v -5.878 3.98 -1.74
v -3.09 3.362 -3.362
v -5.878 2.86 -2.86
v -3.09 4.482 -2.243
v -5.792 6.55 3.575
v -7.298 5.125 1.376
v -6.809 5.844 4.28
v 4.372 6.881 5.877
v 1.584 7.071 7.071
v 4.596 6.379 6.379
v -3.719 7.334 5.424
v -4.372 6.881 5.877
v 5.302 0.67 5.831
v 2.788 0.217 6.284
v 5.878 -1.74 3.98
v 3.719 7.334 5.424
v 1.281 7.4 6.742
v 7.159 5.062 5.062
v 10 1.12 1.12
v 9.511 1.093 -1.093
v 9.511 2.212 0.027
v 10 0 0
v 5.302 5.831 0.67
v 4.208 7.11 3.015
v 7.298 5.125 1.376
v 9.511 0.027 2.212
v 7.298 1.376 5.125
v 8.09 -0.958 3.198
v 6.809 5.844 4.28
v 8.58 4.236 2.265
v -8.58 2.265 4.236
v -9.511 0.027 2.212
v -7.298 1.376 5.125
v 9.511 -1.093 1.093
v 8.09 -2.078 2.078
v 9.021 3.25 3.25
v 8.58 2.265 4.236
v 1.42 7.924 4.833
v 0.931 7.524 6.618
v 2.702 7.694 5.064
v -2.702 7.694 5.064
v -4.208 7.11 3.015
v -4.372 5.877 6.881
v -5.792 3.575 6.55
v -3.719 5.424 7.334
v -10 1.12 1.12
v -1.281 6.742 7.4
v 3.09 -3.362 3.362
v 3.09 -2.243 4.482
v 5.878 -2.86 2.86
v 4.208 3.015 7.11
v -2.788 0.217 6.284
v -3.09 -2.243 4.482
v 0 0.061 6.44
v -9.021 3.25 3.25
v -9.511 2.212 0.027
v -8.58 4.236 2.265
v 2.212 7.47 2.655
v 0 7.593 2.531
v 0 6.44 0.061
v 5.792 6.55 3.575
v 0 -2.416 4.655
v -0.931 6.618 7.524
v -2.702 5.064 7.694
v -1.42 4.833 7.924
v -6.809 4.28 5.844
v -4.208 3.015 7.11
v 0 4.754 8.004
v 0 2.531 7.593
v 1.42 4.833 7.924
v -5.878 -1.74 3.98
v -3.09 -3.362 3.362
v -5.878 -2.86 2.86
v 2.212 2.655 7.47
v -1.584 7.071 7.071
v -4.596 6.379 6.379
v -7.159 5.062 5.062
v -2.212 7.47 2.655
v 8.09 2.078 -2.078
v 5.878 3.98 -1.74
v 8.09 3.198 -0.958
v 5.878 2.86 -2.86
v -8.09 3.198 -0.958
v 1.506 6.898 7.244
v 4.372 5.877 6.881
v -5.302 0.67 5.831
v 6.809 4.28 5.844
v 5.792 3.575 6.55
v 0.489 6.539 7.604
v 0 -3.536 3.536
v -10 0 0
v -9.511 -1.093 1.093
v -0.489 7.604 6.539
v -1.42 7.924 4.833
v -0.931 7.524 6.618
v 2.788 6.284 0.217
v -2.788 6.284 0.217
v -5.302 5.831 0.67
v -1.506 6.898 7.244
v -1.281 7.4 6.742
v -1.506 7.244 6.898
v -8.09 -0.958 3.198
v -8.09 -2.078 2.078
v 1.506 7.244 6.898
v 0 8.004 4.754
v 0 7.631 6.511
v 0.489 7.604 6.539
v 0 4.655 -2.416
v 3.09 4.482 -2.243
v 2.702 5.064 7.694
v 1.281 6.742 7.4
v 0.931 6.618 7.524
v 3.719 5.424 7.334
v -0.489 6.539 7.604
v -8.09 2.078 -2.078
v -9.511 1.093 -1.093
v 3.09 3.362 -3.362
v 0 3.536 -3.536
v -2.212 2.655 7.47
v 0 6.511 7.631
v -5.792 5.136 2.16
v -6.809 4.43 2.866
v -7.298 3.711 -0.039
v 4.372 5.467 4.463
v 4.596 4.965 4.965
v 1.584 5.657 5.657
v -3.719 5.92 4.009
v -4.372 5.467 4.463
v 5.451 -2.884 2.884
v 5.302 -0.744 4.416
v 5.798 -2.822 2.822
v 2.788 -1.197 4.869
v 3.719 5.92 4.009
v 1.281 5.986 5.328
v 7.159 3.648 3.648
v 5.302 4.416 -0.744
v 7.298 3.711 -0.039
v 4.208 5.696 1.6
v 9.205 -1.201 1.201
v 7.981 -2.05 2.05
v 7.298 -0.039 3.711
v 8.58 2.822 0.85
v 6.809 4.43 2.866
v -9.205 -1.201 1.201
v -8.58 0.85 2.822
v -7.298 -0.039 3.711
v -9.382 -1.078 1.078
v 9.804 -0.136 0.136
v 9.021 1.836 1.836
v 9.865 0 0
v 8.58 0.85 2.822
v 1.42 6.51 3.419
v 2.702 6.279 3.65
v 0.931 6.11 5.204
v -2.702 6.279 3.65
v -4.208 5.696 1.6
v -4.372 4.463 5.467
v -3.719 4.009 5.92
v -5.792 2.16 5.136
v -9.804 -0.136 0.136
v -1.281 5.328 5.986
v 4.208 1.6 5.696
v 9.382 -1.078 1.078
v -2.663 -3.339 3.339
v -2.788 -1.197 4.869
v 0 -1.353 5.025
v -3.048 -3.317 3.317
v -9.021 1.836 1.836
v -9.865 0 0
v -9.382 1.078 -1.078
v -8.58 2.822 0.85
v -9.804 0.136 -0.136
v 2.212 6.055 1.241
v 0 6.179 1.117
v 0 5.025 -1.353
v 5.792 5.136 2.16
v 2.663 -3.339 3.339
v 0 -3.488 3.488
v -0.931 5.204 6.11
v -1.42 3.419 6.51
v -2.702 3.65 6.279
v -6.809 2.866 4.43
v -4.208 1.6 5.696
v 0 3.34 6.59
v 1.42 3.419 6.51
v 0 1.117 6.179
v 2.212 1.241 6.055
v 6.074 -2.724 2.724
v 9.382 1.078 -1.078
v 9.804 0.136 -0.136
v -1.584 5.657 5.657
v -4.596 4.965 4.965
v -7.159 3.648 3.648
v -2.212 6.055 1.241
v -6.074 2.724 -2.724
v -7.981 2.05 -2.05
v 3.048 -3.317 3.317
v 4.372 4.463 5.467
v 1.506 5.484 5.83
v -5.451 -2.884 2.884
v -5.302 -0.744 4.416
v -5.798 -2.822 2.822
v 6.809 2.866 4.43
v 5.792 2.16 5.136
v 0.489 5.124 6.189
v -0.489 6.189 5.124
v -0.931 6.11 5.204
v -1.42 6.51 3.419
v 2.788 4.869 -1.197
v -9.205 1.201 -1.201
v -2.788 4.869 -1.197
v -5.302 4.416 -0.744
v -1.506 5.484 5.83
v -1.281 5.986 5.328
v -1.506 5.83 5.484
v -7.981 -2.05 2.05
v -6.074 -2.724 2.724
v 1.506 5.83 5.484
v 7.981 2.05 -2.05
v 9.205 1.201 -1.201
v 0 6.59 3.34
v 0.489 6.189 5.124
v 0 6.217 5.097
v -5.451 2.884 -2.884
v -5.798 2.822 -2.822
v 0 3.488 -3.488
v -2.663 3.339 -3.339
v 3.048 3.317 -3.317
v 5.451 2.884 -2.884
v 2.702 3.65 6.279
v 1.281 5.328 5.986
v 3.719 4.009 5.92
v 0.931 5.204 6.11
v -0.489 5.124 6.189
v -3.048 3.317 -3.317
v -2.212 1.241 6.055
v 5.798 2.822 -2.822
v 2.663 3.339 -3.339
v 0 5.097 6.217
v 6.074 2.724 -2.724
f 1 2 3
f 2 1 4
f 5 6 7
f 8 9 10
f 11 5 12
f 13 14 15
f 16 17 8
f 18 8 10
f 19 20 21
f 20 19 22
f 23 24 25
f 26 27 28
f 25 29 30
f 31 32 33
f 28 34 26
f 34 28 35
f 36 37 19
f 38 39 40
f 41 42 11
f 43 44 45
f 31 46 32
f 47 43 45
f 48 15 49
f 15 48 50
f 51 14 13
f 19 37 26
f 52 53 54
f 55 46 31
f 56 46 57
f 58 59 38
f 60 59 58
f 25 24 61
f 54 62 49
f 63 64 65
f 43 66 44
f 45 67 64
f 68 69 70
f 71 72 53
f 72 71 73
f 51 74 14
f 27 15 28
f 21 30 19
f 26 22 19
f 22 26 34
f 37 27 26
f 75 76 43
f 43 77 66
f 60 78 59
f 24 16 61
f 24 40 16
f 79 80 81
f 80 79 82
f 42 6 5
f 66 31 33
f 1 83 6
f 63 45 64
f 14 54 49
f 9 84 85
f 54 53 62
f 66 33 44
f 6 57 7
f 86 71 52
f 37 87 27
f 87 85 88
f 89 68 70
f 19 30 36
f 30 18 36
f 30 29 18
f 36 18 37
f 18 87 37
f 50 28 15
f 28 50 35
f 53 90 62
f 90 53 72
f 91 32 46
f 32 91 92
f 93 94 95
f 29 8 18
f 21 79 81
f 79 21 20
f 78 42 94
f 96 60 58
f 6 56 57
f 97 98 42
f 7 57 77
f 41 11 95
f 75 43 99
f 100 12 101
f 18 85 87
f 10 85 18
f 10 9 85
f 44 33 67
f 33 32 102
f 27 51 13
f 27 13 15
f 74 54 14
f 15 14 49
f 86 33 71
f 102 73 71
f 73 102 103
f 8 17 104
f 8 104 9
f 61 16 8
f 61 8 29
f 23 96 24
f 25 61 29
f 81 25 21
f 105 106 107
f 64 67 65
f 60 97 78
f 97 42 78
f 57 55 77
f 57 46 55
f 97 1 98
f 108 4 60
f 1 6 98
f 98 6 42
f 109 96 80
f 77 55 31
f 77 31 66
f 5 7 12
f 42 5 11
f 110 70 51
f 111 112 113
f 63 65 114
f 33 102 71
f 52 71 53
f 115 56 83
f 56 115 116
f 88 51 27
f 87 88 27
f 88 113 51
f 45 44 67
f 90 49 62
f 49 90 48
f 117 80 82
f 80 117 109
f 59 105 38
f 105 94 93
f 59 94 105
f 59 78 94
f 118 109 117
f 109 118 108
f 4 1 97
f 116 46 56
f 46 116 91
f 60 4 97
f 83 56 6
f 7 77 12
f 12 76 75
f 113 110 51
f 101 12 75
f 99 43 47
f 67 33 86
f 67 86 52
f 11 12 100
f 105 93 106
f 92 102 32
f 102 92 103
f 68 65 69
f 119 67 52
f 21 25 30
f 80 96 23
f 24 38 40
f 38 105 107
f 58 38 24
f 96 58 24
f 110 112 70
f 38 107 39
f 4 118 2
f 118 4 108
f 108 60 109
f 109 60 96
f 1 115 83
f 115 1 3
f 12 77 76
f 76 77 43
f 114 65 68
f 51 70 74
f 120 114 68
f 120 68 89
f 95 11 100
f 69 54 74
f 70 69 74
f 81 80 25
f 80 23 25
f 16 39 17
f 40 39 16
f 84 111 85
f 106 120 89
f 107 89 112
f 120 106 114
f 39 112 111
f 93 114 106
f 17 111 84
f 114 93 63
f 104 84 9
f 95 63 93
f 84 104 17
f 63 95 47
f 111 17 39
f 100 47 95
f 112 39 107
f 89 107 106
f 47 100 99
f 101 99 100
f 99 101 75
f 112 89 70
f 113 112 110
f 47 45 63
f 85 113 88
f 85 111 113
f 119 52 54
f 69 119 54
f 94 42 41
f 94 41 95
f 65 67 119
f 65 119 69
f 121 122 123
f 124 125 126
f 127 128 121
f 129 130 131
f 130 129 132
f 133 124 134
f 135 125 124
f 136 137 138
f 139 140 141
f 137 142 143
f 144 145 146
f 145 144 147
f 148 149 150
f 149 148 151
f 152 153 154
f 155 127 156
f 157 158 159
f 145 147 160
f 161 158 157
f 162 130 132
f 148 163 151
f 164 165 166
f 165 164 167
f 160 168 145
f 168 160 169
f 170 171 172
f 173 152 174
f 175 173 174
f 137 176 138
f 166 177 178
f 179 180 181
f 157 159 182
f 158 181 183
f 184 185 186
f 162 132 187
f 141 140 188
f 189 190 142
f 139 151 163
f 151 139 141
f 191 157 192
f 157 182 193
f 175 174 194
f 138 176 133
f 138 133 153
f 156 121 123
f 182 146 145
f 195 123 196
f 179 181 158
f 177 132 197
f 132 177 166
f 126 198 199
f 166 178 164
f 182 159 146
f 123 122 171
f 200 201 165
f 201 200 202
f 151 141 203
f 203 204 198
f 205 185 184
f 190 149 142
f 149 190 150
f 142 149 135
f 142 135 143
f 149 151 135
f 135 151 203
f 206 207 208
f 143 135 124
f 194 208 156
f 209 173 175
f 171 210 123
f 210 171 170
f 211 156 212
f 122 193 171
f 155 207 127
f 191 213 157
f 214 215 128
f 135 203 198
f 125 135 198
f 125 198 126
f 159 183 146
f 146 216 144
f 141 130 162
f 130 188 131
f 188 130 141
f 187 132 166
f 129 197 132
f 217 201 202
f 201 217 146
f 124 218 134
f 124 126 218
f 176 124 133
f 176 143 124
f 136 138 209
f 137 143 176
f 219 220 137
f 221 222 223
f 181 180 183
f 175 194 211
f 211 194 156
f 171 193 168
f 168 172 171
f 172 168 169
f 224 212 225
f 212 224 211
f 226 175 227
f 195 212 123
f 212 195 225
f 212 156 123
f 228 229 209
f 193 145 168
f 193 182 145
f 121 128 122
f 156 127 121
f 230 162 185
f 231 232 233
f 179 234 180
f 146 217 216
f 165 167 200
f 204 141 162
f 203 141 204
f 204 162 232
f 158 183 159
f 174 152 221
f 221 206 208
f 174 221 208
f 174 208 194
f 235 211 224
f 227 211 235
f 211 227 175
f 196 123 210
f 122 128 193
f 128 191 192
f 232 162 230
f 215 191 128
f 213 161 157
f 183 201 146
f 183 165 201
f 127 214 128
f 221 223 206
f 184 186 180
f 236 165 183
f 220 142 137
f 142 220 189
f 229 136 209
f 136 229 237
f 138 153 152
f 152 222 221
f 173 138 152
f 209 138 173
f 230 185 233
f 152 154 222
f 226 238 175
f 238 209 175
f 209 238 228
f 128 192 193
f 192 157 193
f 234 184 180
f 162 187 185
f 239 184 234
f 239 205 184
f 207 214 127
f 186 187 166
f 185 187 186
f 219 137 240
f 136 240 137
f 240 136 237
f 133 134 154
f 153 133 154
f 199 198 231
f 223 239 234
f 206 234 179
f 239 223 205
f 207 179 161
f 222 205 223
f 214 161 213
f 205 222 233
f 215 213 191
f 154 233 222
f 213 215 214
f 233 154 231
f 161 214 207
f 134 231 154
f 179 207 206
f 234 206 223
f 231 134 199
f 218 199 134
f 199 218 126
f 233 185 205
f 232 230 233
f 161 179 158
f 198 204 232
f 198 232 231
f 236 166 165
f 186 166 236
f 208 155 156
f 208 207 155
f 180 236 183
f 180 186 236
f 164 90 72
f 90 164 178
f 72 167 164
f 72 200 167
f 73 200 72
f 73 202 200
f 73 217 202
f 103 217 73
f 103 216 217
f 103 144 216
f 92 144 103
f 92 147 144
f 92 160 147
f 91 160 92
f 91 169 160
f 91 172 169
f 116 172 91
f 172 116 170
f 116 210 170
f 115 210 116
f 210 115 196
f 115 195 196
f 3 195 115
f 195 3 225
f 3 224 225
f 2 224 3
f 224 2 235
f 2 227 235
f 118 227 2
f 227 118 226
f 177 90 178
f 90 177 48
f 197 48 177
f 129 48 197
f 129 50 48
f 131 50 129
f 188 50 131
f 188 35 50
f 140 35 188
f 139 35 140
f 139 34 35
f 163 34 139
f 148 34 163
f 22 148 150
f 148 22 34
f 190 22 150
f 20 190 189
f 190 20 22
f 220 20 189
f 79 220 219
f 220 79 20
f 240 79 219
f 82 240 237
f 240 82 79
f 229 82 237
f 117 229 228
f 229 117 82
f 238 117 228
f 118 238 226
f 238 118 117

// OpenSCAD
module mySphere (x, y, z) {
    resize([x, y, z])
    sphere(r = 1, $fn=20);
}

module myEllipse(height, x, y, z) {
    linear_extrude(height = height, center = false, convexity = 10)
        resize([x, y, z])
        // since we are resizing, radius doesn't affect the size.
        // to change the size use x, y, z.
        circle(r = 1, $fn=20);
}

// Existing Keys
dX = 24.28;
dY = 11.20;
dZ = 4.5;

myRadius = 10;
myX = 20;
myY = 10;
myZ = 20;

eHeight = 1.5;

capThickness = 2;

module capNegZ(capThickness, myX, myY, myZ) {
    // Hallow out the cap
    difference () {
        mySphere(myX, myY, myZ);
        translate([0,0, -capThickness]) mySphere(myX, myY, myZ);
    }
}

module cap(capThickness, myX, myY, myZ, eHeight) {
    // Remove the negative z material from the cap
    difference() {
        capNegZ(capThickness, myX, myY, myZ);
         translate([0,0, -1.5]) myEllipse(eHeight, myX, myY, myZ);  
    }
}



module clips(eHeight, myX, myY, myZ) {
    translate([0,0, -1.5]) 
    difference() {
       myEllipse(eHeight, myX, myY, myZ);         
       myEllipse(eHeight, myX - 2, myY - 2 , myZ);           
    }
    // TODO: This ring should become 4 posts:
    // left: 2 "L" posts
    // right: 2 posts with triangles on them for snap on.

}


rotate([-45, 0, 0])
cap(capThickness, myX, myY, myZ, eHeight);

//translate([0,0,-1]) clips(eHeight, myX, myY, myZ);

// TODO: Add rotated (triangular?) sphere on top for ergo- adjustment.

//TODO: Mark part with note name of key
